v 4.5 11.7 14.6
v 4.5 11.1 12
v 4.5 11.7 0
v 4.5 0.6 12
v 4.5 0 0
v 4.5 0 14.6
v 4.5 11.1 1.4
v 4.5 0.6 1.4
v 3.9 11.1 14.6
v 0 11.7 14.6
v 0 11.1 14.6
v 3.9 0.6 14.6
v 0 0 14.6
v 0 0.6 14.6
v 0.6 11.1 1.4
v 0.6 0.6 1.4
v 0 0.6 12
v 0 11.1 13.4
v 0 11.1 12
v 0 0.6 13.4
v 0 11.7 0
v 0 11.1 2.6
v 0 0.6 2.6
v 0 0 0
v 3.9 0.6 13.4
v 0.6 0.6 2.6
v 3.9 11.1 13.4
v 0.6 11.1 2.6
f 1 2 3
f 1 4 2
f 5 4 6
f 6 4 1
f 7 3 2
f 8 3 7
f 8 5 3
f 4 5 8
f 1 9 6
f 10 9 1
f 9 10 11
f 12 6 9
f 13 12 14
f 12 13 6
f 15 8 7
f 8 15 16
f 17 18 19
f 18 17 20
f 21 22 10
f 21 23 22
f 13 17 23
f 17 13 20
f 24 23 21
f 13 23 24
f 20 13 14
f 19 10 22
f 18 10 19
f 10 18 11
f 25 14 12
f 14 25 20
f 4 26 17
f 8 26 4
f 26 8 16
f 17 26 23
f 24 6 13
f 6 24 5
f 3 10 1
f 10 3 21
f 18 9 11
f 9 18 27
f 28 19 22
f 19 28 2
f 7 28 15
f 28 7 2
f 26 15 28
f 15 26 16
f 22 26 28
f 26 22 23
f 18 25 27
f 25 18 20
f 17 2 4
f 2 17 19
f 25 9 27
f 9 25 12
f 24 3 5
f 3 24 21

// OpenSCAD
WS = 0.3;   // pixel to mm
FTH = 1.4 / WS; // floor thickness
TH = 1.3 / WS;   // minimum thickness
TH2 = 0.6 / WS;

l1 = 191.76;
l1connector = false;
l2 = 231.76;
l2connector = false;
w = 39;
d = 15;

h = abs(l2 - l1);
cw = 2 / WS; //max(w - 6 / WS, 4 / WS);
cl = 4 / WS;
// echo("Connector length: " + (cl * WS) + "mm");

translate([0, 0, 1.4]) scale([WS, WS, WS]) {
  // floor & pillars
  // *difference() {
  //   translate([0, 0, -TH]) cube([d, w, h + TH]);
  //   translate([-5, TH, 0]) cube([d + 10, w - TH * 2, h - TH]);
  //   translate([TH, -5, 0]) cube([d - TH * 2, w + 10, h - TH]);
  // }

  // lower box
  cube([d, TH2, h + 4]);
  translate([0, w - TH2, 0]) cube([d, TH2, h + 4]);
  cube([TH2, w, 4]);
  translate([0, 0, h - FTH]) cube([d, w, FTH]);
  translate([d-TH2, 0, h-1]) cube([TH2, w, 4+1]);
  translate([0, 0, -FTH]) cube([d, w, FTH]);

  // lower connector
  if (l1connector) {
    translate([d, (w - cw) / 2, -FTH]) cube([cl, cw, FTH]);
    translate([d+4/WS, w/2, -FTH]) cylinder(r=3/2/WS, h=FTH);
  //   translate([0, 0, -(TH+1.5/WS)]) cube([d, w, TH+1.5/WS]);
  //   translate([d, (w - cw) / 2, -(TH+1.5/WS)]) cube([cl, cw, TH]);
  //   translate([d+4/WS, w/2, -1.7/WS]) cylinder(r=1.5/WS, h=1.7/WS);
  // } else {
  }

  // upper connector
  if (l2connector) {
    #translate([-cl, (w - cw) / 2, h-FTH]) cube([cl, cw, FTH]);
    translate([-4/WS, w/2, h-FTH]) cylinder(r=3/2/WS, h=FTH);
    // translate([0, 0, h - (TH+1.5/WS)]) cube([TH, w, TH+1.5/WS]);
    // translate([-cl, (w - cw) / 2, h - (TH+1.5/WS)]) cube([cl, cw, TH]);
    // translate([-4/WS, w/2, h-1.7/WS]) cylinder(r=1.5/WS, h=1.7/WS);
  }
}
